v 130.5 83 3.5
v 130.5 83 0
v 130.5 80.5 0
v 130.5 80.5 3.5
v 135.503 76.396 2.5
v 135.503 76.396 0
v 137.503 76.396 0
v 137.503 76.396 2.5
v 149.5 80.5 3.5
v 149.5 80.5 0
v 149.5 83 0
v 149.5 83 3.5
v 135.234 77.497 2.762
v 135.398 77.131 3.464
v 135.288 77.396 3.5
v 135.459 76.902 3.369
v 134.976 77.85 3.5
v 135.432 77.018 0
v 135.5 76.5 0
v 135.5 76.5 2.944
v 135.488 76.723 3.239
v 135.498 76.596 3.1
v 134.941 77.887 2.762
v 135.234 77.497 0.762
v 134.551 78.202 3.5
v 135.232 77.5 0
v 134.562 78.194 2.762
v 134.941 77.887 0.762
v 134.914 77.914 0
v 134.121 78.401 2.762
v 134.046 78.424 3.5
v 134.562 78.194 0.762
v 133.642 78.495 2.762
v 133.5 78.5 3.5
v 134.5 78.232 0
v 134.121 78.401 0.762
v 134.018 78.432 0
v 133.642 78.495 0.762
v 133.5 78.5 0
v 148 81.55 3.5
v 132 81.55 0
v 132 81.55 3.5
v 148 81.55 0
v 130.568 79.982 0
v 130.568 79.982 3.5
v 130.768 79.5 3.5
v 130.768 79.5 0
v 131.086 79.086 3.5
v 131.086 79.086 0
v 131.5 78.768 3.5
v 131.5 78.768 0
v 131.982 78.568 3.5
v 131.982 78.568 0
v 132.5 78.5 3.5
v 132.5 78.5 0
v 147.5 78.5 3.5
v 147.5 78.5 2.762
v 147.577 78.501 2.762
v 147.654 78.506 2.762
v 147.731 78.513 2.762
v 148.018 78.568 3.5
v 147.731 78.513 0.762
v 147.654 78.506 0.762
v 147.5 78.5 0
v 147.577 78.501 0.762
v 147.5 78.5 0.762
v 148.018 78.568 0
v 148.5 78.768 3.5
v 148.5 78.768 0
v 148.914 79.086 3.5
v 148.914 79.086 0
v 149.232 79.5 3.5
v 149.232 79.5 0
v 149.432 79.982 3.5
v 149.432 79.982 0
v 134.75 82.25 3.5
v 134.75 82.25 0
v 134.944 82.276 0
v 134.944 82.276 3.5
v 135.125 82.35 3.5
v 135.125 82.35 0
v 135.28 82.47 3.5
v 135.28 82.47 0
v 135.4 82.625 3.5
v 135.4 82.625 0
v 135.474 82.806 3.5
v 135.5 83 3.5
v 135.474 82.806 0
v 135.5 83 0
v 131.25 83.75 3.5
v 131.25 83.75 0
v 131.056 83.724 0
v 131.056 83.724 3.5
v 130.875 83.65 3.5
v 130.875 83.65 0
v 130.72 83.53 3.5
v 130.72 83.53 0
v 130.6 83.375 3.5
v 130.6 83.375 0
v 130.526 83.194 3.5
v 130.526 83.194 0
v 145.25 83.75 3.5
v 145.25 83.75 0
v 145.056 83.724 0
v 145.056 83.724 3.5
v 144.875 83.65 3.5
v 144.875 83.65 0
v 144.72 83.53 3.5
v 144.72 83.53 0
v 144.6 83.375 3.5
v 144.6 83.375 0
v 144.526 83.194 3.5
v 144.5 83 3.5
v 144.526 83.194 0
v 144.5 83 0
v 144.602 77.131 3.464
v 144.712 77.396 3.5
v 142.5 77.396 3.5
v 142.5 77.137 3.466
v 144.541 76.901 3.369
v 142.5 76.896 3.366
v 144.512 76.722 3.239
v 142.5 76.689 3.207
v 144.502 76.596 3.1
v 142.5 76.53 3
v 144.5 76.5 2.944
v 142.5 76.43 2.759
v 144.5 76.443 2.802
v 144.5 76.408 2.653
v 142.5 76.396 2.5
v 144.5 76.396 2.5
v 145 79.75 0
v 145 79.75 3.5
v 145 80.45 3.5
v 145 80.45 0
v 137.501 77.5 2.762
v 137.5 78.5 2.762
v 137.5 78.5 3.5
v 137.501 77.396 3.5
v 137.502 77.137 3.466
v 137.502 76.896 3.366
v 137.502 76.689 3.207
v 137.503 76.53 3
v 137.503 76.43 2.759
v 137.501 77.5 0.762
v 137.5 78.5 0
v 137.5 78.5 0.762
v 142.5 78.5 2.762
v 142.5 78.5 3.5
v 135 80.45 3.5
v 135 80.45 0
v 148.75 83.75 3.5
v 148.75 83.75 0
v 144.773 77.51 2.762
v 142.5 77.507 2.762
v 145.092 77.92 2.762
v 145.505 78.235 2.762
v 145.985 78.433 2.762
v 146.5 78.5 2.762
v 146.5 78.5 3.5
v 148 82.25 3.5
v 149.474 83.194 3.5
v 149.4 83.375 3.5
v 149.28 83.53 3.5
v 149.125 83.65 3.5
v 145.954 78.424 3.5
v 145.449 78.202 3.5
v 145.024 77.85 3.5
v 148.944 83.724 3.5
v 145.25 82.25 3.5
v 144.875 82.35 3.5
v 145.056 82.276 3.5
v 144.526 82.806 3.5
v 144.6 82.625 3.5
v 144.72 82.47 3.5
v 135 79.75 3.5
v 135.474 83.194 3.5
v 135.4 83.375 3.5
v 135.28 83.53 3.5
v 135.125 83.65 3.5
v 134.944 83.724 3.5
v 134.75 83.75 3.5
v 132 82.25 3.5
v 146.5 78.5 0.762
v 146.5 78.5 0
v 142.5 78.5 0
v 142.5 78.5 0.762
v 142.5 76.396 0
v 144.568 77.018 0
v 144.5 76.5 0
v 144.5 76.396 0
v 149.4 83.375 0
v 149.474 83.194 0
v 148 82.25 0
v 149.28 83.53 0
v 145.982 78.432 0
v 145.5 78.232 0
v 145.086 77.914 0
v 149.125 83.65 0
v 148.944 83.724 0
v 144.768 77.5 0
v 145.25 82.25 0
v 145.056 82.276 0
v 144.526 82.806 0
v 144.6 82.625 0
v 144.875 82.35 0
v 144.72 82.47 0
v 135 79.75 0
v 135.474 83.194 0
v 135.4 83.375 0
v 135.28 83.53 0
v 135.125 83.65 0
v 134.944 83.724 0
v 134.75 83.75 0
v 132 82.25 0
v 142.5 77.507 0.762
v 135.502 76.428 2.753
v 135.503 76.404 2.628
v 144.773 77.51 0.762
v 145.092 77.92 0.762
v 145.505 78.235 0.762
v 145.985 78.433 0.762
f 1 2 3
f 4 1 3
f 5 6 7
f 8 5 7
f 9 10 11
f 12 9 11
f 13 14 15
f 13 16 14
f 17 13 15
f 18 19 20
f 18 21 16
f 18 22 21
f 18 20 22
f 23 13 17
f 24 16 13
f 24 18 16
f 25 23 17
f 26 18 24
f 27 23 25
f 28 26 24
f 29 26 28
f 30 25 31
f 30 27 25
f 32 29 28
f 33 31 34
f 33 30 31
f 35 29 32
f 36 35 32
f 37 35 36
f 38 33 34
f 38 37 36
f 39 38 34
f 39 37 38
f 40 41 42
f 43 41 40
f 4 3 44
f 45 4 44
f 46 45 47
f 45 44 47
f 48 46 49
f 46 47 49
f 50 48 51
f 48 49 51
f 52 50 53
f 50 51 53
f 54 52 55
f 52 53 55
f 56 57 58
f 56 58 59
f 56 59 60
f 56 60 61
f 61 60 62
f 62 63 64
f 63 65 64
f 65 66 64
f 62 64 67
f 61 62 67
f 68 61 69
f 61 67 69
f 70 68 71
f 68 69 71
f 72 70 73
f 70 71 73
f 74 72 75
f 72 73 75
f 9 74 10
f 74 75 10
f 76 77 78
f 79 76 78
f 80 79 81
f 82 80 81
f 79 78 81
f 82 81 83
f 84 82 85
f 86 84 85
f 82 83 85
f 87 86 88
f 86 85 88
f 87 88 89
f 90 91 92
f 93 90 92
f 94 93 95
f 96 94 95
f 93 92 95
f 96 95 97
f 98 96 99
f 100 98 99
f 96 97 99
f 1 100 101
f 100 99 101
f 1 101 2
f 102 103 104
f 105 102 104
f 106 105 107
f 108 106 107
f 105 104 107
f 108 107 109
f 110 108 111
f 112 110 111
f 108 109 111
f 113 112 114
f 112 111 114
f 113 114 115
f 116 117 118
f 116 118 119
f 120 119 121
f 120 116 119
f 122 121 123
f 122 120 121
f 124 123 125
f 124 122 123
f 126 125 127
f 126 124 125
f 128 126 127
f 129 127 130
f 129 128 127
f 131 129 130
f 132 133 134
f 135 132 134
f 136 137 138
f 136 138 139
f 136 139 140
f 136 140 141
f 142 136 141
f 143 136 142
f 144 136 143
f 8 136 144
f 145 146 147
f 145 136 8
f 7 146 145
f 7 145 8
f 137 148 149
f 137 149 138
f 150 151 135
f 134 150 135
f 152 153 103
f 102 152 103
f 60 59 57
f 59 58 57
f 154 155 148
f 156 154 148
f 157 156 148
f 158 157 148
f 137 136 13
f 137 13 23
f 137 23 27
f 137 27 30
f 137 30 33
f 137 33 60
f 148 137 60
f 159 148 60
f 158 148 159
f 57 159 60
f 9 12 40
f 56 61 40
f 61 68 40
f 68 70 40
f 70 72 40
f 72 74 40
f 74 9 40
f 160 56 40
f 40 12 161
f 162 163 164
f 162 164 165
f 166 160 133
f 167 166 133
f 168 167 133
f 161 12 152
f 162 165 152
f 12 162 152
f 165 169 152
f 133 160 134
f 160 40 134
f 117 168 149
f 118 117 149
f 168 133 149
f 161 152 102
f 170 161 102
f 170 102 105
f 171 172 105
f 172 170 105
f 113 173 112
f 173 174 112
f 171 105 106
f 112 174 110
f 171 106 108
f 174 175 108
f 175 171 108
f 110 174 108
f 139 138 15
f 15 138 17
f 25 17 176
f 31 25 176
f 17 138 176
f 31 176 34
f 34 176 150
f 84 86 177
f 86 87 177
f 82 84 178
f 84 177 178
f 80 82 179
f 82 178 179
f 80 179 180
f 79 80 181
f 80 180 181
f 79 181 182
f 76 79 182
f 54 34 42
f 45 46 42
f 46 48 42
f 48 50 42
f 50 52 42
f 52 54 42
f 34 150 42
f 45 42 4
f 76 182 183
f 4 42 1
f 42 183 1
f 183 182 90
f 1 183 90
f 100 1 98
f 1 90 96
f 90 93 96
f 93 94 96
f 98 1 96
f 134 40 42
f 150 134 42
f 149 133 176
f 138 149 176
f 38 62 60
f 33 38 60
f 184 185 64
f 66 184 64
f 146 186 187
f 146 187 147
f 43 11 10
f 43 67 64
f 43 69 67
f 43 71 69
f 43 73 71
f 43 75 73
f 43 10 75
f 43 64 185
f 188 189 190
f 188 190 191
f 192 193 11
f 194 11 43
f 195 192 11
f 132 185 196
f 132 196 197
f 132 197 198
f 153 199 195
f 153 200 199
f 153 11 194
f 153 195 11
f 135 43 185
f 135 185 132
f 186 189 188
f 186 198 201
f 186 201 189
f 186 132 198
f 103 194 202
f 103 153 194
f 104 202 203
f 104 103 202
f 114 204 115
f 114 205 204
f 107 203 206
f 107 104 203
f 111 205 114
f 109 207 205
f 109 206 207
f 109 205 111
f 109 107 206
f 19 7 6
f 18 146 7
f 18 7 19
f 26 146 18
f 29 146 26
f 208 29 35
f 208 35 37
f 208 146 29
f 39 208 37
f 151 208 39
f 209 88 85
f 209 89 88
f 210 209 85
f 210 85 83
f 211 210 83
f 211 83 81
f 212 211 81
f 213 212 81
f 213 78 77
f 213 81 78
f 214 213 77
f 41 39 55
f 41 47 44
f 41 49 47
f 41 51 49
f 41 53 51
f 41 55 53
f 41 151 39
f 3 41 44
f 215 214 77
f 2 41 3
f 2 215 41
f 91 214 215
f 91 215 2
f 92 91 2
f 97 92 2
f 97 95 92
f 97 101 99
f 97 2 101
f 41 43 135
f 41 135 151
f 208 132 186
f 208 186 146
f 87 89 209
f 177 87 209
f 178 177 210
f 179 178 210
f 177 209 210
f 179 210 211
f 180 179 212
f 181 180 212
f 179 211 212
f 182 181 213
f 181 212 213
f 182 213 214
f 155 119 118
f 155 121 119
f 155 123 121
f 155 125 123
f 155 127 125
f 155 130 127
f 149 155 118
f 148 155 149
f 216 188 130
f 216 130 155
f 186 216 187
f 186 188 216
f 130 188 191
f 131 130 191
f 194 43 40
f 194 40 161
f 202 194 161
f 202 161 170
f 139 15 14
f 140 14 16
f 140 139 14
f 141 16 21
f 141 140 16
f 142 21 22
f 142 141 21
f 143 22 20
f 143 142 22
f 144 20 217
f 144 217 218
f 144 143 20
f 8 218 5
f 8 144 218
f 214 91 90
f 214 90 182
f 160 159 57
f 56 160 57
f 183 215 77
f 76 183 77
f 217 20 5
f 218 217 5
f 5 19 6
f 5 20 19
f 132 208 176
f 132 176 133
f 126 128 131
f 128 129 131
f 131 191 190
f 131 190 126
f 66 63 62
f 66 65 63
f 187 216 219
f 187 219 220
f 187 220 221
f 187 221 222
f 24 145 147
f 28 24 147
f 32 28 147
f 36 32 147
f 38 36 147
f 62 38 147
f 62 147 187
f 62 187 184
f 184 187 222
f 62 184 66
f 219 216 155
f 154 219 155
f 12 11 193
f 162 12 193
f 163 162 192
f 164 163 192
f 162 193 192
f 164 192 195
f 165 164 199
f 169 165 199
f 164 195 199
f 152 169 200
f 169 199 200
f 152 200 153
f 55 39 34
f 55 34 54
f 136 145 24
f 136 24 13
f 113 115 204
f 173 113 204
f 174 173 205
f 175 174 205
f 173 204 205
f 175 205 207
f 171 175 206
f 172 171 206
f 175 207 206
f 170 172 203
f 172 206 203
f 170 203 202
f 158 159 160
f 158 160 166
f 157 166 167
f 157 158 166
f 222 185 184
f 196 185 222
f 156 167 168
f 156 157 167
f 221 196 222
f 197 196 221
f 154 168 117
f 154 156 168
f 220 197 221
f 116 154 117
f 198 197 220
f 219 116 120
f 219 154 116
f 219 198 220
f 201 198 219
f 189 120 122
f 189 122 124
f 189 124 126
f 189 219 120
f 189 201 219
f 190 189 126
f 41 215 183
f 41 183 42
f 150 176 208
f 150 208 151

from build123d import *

# Parameters (mm, degrees)
SKETCH_W          = 10
SKETCH_H          = 0.7
PAD_DEPTH         = 3.5
SKETCH001_W       = 1
SKETCH001_H       = 2
POCKET_DEPTH      = 7.003756
POCKET_DEPTH_BACK = 12.007881
FILLET_R          = 1


with BuildPart() as part:
    # Sketch → Pad (new body)
    with BuildSketch(Plane.XY):
        with BuildLine():
            Line((148, 81.55), (148, 82.25))
            Line((148, 82.25), (145.25, 82.25))
            ThreePointArc((144.5, 83), (144.71967, 82.46967), (145.25, 82.25))
            ThreePointArc((145.25, 83.75), (144.71967, 83.53033), (144.5, 83))
            Line((148.75, 83.75), (145.25, 83.75))
            ThreePointArc((149.5, 83), (149.28033, 83.53033), (148.75, 83.75))
            Line((149.5, 80.5), (149.5, 83))
            ThreePointArc((147.5, 78.5), (148.914214, 79.085786), (149.5, 80.5))
            Line((146.5, 78.5), (147.5, 78.5))
            ThreePointArc((146.5, 78.5), (145.085786, 77.914214), (144.5, 76.5))
            Line((144.5, 76.395912), (144.5, 76.5))
            Line((142.5, 76.395912), (144.5, 76.395912))
            Line((142.5, 76.395912), (142.5, 78.5))
            Line((142.5, 78.5), (137.5, 78.5))
            Line((137.5, 78.5), (137.502762, 76.395912))
            Line((135.502762, 76.395912), (137.502762, 76.395912))
            Line((135.5, 76.5), (135.502762, 76.395912))
            ThreePointArc((135.5, 76.5), (134.914214, 77.914214), (133.5, 78.5))
            Line((133.5, 78.5), (132.5, 78.5))
            ThreePointArc((130.5, 80.5), (131.085786, 79.085786), (132.5, 78.5))
            Line((130.5, 83), (130.5, 80.5))
            ThreePointArc((131.25, 83.75), (130.71967, 83.53033), (130.5, 83))
            Line((131.25, 83.75), (134.75, 83.75))
            ThreePointArc((135.5, 83), (135.28033, 83.53033), (134.75, 83.75))
            ThreePointArc((134.75, 82.25), (135.28033, 82.46967), (135.5, 83))
            Line((132, 82.25), (134.75, 82.25))
            Line((132, 82.25), (132, 81.55))
            Line((132, 81.55), (148, 81.55))
        make_face()
        with Locations((140, 80.1)):
            Rectangle(SKETCH_W, SKETCH_H, mode=Mode.SUBTRACT)
    extrude(amount=PAD_DEPTH)

    # Sketch001 (on DatumPlane) → Pocket (cut, two sides)
    with BuildSketch(Plane(origin=(137.602808, 0.180629, 0), x_dir=(-0.001313, 0.999999, 0), z_dir=(0.999999, 0.001313, 0))) as pocket_sk:
        with Locations((77.819439, 1.76189)):
            Rectangle(SKETCH001_W, SKETCH001_H)
    extrude(amount=-POCKET_DEPTH, mode=Mode.SUBTRACT)
    extrude(pocket_sk.sketch, amount=POCKET_DEPTH_BACK, mode=Mode.SUBTRACT)

    # Fillet
    fillet_edges = [part.edges().sort_by_distance(p)[0] for p in [
        (143.5, 76.395912, 3.5),
        (136.502762, 76.395912, 3.5),
    ]]
    fillet(fillet_edges, radius=FILLET_R)


solid = part.part
